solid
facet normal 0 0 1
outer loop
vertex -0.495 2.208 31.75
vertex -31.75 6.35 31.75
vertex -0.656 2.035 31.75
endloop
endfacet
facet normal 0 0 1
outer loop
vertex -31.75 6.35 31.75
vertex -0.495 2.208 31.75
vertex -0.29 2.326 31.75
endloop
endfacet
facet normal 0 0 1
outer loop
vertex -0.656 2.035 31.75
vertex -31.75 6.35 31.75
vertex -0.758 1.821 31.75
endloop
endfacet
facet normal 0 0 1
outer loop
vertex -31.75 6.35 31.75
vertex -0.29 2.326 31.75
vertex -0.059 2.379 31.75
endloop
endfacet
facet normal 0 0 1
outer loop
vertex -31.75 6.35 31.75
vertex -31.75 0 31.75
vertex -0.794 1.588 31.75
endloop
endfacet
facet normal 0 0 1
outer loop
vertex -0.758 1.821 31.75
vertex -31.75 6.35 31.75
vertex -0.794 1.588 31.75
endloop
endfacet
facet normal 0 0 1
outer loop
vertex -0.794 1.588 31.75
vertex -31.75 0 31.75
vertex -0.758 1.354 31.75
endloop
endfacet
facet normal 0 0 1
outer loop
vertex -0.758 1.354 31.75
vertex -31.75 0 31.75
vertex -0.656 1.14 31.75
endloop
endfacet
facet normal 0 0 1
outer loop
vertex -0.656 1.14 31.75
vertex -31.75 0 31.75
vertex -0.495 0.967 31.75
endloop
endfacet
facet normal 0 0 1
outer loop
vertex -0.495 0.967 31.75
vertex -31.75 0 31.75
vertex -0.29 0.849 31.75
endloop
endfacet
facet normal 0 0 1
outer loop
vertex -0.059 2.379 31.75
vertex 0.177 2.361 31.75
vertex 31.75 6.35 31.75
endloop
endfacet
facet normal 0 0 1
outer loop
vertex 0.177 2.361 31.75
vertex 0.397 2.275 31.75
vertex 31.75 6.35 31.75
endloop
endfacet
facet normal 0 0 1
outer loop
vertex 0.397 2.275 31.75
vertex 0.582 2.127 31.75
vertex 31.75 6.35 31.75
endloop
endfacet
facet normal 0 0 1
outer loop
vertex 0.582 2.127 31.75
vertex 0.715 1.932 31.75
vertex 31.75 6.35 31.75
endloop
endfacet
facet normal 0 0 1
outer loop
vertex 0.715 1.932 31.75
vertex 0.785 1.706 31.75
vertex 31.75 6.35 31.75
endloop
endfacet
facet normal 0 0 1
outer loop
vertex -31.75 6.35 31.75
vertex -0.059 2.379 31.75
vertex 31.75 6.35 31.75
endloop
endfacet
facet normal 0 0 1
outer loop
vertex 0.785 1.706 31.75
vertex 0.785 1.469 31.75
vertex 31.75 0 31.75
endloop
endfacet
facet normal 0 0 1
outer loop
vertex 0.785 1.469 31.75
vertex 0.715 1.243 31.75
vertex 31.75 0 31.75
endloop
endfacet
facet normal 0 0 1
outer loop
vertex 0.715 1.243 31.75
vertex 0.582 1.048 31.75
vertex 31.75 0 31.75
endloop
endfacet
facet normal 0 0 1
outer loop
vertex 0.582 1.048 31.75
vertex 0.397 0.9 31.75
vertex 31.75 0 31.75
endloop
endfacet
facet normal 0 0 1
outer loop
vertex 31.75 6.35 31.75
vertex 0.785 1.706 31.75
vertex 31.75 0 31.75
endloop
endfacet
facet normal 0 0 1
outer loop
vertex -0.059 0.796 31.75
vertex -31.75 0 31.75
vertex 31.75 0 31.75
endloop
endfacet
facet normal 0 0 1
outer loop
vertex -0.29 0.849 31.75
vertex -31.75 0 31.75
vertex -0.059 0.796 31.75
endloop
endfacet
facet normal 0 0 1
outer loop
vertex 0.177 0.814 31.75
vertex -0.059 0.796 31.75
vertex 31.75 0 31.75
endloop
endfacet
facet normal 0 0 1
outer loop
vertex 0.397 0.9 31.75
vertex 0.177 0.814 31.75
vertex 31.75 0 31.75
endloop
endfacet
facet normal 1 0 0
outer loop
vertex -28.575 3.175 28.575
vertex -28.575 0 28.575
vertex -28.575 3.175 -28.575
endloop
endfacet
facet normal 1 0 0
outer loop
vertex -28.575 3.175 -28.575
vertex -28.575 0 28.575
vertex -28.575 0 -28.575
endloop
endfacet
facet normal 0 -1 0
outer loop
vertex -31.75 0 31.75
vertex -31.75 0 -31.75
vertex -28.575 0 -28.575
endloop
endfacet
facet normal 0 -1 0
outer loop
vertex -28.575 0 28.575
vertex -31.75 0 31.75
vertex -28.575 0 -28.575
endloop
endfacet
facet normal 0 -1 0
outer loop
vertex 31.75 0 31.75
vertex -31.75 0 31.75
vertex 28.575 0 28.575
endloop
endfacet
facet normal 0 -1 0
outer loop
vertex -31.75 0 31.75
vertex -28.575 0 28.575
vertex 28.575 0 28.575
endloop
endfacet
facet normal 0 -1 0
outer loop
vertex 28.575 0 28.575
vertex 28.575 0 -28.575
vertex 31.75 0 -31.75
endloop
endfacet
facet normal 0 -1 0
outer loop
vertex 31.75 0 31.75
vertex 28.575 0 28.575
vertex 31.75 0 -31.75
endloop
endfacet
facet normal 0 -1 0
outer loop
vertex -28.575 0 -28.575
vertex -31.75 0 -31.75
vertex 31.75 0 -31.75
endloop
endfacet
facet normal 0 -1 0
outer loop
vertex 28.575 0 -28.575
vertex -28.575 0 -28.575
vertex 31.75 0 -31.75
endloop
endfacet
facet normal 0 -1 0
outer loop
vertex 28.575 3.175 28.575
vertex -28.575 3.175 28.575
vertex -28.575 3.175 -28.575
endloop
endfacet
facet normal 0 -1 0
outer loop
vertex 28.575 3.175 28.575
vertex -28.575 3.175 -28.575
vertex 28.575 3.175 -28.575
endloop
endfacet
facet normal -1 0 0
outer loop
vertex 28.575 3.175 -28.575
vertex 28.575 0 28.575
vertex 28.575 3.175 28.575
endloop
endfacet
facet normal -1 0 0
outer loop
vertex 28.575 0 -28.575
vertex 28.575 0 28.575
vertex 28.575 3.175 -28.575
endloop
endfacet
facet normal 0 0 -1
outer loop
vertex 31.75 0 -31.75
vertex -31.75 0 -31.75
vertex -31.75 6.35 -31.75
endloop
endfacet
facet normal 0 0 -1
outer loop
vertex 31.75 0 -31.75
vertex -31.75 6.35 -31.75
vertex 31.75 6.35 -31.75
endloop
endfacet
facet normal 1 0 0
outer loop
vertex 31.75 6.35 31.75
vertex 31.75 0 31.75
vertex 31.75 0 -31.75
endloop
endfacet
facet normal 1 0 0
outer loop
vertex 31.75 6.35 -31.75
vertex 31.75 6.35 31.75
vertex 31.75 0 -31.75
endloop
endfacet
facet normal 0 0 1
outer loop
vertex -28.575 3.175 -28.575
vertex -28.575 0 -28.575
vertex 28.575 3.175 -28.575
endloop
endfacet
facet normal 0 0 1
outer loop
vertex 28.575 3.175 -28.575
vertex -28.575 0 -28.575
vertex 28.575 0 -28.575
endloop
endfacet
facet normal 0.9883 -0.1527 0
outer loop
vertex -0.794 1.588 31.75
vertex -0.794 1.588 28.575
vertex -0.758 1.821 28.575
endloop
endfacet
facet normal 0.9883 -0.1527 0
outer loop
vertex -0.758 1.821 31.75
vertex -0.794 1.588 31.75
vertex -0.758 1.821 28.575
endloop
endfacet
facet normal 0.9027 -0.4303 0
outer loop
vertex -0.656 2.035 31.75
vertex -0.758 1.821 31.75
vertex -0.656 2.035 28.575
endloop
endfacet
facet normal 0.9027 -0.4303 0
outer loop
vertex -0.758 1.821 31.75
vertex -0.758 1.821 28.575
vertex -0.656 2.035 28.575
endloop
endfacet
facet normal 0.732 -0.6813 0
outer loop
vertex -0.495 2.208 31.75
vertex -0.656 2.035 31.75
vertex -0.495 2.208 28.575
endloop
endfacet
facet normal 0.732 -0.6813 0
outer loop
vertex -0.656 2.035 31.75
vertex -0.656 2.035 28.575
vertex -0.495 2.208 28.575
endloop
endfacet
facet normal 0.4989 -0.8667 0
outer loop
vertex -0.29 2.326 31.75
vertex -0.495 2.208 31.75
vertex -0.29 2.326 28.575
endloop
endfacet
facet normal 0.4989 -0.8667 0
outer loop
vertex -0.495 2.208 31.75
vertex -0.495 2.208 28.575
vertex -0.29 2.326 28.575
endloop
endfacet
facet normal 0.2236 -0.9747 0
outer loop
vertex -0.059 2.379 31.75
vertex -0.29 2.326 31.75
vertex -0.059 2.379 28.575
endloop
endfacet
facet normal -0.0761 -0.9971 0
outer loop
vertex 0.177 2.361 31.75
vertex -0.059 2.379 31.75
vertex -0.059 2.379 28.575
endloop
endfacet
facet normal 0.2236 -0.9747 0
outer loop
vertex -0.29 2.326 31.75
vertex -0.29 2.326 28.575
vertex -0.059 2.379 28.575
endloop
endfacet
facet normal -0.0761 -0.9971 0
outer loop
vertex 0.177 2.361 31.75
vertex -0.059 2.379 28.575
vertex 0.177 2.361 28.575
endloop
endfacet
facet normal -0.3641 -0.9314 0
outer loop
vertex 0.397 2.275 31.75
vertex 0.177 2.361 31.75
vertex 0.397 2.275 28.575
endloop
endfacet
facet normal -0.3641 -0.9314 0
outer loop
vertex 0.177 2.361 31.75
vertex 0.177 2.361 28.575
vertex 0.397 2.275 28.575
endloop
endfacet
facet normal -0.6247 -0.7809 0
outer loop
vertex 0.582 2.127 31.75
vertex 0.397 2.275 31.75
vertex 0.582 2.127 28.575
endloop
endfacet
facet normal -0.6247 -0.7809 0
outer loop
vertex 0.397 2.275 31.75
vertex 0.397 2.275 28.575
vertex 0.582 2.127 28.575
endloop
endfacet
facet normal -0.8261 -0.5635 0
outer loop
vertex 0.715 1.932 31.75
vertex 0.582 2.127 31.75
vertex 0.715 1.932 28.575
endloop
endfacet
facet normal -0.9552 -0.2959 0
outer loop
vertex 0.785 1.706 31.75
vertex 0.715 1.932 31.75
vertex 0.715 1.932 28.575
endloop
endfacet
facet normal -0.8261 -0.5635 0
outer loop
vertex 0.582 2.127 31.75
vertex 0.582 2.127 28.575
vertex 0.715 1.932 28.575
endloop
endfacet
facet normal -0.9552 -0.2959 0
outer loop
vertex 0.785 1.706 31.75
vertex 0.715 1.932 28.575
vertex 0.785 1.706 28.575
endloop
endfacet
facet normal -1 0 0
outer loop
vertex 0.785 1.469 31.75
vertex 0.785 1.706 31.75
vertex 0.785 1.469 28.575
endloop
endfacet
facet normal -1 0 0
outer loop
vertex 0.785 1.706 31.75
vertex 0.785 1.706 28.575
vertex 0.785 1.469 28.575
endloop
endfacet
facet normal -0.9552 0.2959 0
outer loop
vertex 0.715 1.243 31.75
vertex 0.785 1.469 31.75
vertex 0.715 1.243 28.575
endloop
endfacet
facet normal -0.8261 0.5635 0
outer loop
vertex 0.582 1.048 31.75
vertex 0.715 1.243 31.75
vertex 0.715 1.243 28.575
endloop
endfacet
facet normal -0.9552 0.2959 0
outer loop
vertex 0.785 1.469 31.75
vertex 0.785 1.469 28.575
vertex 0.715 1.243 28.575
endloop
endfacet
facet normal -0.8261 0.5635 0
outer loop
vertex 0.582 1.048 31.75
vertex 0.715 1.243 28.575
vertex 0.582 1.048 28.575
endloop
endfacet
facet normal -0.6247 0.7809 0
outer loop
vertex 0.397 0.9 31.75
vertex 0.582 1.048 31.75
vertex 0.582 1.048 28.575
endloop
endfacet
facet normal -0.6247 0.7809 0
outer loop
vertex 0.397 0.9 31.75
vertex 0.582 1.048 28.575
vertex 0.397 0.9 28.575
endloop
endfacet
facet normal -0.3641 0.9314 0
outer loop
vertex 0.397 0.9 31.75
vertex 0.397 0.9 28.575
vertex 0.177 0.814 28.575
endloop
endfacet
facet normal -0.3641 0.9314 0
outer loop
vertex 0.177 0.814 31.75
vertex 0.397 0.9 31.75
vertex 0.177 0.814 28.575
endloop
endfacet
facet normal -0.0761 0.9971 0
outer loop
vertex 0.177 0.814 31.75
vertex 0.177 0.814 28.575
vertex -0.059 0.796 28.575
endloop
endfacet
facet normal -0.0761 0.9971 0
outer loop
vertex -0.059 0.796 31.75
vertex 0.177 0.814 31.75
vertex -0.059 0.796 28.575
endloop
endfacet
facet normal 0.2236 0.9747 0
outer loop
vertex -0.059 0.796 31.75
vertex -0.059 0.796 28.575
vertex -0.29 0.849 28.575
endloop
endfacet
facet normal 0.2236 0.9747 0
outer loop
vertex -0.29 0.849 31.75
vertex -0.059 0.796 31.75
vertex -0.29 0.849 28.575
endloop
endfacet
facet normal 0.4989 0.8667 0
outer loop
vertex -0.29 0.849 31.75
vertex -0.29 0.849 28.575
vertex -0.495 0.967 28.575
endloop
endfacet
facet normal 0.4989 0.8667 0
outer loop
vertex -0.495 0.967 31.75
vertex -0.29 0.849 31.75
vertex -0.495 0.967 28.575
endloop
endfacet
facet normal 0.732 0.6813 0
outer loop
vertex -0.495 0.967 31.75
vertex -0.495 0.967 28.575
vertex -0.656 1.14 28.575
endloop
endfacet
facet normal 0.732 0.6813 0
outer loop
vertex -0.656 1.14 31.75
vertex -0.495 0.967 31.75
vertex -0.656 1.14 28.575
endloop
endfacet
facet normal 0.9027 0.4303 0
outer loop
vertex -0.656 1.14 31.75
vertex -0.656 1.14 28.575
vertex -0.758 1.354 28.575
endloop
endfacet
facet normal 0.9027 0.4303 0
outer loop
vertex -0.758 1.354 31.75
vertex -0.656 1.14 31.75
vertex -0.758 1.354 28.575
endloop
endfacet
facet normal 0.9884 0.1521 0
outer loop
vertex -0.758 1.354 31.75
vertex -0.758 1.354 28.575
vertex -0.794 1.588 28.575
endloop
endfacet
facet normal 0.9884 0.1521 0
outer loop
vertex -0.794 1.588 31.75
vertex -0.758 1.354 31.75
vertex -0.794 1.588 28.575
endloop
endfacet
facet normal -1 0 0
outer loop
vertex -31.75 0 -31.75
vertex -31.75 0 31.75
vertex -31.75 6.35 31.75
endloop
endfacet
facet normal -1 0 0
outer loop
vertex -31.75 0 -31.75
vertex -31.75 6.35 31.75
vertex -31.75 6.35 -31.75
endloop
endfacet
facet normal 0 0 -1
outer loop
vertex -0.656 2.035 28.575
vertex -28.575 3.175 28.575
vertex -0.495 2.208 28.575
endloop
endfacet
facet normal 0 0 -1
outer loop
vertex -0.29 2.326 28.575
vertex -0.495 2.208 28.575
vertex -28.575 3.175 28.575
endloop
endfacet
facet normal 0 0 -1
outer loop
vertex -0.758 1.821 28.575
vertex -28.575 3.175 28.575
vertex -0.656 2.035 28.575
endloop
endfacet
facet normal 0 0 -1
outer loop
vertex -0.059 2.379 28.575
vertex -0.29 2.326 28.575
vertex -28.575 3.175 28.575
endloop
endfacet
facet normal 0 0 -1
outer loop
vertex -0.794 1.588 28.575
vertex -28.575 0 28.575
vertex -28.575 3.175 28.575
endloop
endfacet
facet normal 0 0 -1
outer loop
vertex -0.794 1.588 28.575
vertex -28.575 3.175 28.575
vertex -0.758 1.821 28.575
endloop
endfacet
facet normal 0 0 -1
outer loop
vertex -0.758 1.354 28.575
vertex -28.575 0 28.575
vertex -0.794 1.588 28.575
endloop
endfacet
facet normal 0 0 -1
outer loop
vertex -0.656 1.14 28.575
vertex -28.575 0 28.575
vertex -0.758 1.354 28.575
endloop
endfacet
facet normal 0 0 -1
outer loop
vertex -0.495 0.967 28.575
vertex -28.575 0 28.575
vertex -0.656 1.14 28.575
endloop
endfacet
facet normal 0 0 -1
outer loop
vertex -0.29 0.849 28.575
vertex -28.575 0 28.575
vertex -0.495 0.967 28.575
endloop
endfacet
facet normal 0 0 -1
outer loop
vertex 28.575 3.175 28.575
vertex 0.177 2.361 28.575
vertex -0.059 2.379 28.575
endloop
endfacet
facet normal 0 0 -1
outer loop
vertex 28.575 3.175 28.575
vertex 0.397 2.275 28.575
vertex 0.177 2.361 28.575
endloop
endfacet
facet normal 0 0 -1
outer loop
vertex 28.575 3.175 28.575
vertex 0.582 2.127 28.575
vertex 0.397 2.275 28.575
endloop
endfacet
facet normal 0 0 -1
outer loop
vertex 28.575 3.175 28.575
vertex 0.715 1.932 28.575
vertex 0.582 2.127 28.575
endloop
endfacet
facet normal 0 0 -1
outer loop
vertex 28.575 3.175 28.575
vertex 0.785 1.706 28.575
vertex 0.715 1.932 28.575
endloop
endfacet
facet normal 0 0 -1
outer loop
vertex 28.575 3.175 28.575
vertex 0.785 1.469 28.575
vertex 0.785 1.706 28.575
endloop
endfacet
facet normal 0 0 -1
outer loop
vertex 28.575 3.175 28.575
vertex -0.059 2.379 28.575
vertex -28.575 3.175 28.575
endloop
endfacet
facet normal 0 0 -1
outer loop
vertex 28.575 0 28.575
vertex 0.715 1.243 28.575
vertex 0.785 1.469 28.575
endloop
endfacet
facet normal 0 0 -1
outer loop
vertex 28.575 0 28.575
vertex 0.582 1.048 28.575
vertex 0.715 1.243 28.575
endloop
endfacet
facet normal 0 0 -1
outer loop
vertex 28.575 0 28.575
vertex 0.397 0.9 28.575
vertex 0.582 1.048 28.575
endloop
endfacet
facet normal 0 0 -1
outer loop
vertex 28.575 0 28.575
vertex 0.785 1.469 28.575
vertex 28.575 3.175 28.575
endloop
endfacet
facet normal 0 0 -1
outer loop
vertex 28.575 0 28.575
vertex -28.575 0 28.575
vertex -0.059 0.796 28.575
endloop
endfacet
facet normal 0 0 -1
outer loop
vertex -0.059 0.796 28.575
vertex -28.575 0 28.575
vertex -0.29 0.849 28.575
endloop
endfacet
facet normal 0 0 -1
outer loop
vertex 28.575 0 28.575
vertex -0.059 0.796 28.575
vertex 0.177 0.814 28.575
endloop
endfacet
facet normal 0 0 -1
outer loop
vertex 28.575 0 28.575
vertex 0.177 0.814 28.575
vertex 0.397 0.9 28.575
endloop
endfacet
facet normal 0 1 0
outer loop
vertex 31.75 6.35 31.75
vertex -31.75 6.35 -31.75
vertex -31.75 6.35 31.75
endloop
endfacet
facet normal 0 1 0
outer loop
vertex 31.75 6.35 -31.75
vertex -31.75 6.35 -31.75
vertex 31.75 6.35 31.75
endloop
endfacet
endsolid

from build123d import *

# Parameters (mm, degrees)
SKETCH1_W           = 127
SKETCH1_H           = 127
BOSS_EXTRUDE1_DEPTH = 12.7
SHELL1_T            = -6.35
SCALE1_SCALE        = 0.5
SKETCH2_R           = 0.79375
CUT_EXTRUDE2_DEPTH  = 69.465251223


with BuildPart() as part:
    # Sketch1 → Boss-Extrude1 (new body)
    with BuildSketch(Plane(origin=(0, 0, 0), x_dir=(1, 0, 0), z_dir=(0, 1, 0))):
        Rectangle(SKETCH1_W, SKETCH1_H)
    extrude(amount=BOSS_EXTRUDE1_DEPTH)

    # Shell1
    shell1_openings = [part.faces().sort_by_distance(p)[0] for p in [
        (0, 0, 0),
    ]]
    offset(amount=SHELL1_T, openings=shell1_openings, kind=Kind.INTERSECTION)


with BuildPart() as part_1:
    # Scale1: scaled about (0, 0, 0)
    add(part.part.scale(SCALE1_SCALE))

    # Sketch2 → Cut-Extrude2 (cut, through all)
    with BuildSketch(Plane(origin=(0, 0, 28.575), x_dir=(-1, 0, 0), z_dir=(0, 0, -1))):
        with Locations((0, 1.5875)):
            Circle(SKETCH2_R)
    extrude(amount=-CUT_EXTRUDE2_DEPTH, mode=Mode.SUBTRACT)


solid = part_1.part
